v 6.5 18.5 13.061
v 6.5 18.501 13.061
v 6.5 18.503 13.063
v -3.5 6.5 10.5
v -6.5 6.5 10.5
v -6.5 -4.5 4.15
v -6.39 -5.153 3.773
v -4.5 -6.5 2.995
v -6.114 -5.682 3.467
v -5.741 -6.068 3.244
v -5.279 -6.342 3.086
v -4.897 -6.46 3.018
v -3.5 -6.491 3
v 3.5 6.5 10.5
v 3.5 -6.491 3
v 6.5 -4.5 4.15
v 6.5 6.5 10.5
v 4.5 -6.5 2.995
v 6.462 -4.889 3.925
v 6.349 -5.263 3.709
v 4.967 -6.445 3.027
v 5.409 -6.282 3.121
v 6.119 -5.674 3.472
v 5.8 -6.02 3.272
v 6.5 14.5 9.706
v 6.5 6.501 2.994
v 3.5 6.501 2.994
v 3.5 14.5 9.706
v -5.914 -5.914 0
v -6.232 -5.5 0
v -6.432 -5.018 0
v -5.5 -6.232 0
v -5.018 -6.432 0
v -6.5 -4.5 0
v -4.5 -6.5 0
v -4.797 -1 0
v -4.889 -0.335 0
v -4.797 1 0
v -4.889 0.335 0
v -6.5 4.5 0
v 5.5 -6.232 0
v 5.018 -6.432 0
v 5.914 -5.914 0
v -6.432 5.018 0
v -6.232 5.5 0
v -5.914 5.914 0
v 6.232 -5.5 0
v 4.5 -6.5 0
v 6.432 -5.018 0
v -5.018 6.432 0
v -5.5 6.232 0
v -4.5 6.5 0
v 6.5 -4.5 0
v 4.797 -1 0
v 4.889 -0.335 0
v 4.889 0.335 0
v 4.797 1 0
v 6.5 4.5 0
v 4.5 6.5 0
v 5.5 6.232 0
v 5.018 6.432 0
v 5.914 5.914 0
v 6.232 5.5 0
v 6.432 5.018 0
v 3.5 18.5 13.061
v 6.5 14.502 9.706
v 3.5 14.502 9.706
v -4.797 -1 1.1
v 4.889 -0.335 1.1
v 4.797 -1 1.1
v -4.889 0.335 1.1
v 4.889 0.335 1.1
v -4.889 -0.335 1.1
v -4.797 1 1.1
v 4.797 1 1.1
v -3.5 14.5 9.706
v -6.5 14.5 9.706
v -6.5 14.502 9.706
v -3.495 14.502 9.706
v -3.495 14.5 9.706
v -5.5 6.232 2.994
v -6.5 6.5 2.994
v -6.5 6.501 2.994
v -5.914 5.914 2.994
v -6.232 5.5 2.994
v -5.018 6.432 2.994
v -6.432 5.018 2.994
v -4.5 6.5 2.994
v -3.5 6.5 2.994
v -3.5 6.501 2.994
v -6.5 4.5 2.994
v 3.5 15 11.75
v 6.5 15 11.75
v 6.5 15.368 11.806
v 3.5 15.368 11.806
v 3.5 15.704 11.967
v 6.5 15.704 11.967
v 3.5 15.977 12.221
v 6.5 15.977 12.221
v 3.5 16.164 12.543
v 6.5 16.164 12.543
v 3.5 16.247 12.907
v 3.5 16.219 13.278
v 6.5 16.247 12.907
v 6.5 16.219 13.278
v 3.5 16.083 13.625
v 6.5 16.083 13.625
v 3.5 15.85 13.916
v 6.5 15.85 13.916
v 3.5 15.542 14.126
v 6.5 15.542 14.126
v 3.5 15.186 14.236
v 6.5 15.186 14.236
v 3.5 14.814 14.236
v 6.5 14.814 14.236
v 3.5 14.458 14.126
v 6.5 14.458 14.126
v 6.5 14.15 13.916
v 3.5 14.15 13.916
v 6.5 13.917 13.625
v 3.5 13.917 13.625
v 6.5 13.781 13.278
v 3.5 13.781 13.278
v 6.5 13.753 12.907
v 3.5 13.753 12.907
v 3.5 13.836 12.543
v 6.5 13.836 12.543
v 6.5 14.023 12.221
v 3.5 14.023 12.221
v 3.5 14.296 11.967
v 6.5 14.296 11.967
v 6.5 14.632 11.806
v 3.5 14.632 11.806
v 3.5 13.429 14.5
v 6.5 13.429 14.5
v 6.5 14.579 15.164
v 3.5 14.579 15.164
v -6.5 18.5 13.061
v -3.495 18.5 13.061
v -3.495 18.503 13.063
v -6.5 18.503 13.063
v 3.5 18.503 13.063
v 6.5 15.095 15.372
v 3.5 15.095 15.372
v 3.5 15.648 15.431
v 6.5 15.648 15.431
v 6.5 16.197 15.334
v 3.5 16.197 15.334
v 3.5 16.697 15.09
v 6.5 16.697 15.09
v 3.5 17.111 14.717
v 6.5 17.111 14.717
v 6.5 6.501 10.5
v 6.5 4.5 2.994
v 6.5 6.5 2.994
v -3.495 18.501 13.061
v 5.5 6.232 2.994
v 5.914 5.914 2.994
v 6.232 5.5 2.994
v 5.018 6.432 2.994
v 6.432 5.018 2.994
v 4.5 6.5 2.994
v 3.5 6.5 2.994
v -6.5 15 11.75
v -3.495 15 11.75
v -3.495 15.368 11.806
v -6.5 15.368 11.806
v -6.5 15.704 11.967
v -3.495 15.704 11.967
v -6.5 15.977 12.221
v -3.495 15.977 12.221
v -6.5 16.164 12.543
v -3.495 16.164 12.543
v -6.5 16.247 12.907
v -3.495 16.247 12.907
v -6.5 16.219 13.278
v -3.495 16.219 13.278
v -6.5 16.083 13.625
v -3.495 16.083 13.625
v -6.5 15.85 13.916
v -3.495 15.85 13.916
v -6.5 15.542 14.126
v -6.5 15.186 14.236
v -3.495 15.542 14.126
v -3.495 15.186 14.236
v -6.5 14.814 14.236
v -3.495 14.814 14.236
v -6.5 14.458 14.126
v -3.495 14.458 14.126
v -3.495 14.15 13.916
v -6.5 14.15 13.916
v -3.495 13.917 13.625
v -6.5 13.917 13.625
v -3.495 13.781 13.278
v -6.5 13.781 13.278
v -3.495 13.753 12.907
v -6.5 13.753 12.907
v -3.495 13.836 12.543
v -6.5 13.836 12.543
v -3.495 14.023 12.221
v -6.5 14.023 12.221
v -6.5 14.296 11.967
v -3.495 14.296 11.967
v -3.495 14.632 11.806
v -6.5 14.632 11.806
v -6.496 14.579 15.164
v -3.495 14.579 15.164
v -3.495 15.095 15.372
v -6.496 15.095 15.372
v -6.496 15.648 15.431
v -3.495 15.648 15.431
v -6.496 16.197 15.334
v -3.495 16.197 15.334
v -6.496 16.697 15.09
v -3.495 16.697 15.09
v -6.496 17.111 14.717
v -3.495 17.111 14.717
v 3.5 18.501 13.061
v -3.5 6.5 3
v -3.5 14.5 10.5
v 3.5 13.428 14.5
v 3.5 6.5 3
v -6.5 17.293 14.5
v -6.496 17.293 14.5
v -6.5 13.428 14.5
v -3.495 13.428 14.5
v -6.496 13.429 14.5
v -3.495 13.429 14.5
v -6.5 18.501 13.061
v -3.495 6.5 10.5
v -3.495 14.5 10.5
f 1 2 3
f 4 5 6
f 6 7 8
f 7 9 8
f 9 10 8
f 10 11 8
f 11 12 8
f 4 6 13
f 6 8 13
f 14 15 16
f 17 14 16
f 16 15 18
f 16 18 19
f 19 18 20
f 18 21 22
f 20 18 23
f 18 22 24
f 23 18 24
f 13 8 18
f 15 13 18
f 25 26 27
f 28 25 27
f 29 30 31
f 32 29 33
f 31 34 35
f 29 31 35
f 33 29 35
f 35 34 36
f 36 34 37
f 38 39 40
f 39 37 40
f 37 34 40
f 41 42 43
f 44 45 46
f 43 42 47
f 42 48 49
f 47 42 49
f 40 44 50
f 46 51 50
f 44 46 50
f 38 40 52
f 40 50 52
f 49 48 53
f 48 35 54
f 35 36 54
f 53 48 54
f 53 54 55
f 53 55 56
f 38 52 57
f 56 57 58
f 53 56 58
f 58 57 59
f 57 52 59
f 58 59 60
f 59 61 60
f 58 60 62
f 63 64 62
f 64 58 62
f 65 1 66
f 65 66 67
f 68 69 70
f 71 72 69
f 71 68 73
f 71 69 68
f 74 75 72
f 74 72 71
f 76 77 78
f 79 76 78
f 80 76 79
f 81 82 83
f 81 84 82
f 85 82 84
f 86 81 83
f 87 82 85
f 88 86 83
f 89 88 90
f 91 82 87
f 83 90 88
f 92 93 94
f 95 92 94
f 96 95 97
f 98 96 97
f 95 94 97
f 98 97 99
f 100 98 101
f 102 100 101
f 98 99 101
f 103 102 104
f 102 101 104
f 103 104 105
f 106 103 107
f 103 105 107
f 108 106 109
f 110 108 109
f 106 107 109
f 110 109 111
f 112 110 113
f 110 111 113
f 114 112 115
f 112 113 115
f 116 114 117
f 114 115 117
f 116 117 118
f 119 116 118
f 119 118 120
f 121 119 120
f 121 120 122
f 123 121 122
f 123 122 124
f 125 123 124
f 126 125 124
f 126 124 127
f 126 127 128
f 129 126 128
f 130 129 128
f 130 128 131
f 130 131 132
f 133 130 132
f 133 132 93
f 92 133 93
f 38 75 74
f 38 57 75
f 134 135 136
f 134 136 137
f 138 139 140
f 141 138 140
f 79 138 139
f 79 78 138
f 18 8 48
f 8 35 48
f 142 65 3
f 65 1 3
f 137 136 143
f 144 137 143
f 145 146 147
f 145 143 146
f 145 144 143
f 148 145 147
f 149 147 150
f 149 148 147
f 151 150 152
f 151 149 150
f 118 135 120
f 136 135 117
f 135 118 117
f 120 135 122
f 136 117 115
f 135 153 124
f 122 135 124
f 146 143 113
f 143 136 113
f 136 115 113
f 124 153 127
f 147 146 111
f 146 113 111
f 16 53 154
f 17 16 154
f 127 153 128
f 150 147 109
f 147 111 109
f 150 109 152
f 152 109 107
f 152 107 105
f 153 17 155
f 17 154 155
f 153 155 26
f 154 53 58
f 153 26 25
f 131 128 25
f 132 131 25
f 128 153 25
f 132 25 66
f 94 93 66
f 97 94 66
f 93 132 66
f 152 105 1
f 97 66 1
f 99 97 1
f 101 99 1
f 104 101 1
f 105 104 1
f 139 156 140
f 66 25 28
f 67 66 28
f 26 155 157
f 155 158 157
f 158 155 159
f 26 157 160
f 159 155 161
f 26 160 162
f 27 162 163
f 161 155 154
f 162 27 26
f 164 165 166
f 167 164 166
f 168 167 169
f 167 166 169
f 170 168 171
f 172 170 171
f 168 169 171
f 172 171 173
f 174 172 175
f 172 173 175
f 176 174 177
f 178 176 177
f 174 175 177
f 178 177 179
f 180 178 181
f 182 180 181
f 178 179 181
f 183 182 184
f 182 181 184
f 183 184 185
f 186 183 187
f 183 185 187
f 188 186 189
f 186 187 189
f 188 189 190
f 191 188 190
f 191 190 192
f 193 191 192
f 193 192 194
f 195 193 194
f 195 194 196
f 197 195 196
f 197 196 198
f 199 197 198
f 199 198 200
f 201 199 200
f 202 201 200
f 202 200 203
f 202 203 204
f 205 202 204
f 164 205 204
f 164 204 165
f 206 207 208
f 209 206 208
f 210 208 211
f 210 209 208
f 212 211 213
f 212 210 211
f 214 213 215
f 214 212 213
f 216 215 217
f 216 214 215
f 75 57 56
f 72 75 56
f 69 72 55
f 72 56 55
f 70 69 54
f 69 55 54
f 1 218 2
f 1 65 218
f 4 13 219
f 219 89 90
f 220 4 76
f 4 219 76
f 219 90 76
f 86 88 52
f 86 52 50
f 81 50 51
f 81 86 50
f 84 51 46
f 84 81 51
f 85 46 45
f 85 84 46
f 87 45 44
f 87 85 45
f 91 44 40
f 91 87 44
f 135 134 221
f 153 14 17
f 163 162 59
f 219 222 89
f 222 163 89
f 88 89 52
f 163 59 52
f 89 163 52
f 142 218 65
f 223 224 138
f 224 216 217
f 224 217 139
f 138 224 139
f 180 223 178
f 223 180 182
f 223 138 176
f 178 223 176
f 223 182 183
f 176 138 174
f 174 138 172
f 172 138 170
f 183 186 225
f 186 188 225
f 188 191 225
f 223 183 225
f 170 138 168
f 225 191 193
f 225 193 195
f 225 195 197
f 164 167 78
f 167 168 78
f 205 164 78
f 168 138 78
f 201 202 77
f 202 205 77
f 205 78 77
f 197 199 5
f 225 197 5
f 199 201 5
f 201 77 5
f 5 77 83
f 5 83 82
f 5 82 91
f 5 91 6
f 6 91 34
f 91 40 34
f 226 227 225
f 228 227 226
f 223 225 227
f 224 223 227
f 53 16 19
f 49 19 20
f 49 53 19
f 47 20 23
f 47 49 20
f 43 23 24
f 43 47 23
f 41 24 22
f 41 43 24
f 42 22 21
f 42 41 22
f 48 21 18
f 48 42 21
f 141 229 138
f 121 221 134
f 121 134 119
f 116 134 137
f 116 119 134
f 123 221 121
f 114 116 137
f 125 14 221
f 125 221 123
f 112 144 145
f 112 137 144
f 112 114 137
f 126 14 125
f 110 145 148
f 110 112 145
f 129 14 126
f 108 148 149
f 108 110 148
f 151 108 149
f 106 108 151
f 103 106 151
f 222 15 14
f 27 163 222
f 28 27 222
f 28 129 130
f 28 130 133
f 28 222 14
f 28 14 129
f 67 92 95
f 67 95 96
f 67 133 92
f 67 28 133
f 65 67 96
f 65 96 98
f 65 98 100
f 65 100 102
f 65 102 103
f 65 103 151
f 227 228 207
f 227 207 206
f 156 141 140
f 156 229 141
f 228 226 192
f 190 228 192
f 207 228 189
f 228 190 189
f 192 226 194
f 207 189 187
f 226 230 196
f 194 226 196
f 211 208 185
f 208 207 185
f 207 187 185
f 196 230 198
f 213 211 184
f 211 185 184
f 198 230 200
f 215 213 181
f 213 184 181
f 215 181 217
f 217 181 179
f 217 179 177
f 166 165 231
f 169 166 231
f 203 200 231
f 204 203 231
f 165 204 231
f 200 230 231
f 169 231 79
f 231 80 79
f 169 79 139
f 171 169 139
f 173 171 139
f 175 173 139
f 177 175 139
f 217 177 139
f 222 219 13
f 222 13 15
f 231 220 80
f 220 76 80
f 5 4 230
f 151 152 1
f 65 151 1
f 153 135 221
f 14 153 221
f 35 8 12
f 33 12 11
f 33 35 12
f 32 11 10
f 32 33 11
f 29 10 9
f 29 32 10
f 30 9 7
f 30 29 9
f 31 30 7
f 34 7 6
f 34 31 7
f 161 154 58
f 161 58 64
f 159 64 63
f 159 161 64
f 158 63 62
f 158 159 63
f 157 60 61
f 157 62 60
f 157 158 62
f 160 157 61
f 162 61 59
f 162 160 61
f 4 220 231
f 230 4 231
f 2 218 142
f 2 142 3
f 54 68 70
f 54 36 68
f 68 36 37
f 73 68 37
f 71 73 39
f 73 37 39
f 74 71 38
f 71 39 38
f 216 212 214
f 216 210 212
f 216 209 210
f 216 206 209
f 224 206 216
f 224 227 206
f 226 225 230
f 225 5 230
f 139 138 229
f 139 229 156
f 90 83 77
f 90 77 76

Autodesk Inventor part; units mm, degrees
ref_plane "YZ Plane" through (0, 0, 0) normal (1, 0, 0) x (0, 1, 0)
ref_plane "XZ Plane" through (0, 0, 0) normal (0, 1, 0) x (-1, 0, 0)
ref_plane "XY Plane" through (0, 0, 0) normal (0, 0, 1) x (1, 0, 0)
sketch "Sketch1" plane through (0, 0, 0) normal (0, 0, 1) x (1, 0, 0)
  line L0 (6.5, 6.5) -> (-6.5, 6.5)
  line L1 (-6.5, 6.5) -> (-6.5, -6.5)
  line L2 (-6.5, -6.5) -> (6.5, -6.5)
  line L3 (6.5, -6.5) -> (6.5, 6.5)
  line L4 (6.5, 6.5) -> (-6.5, -6.5) construction
  line L5 (-6.5, 6.5) -> (6.5, -6.5) construction
  point P0 (0, 0)
  point P1 (0, 0)
  dimension "d35" = 13
  dimension "d36" = 13
extrude "Extrusion1" add sketch "Sketch1" along normal blind 3
sketch "Sketch2" plane through (0, 0, 0) normal (0, 0, -1) x (-1, 0, 0)
  line L0 (-6.5, 1) -> (6.5, 1)
  line L1 (6.5, 1) -> (6.5, -1)
  line L2 (6.5, -1) -> (-6.5, -1)
  line L3 (-6.5, -1) -> (-6.5, 1)
  line L4 (-6.5, 1) -> (6.5, -1) construction
  line L5 (6.5, 1) -> (-6.5, -1) construction
  circle A0 centre (0, 0) radius 4.9
  point P0 (4.7969, 1)
  point P1 (-4.7969, 1)
  point P2 (-4.7969, -1)
  point P3 (4.7969, -1)
  dimension "d3" = 2
  dimension "d4" = 13
  dimension "d57" = 9.8
extrude "Extrusion2" cut sketch "Sketch2" against normal blind 1.1 contours L0 A0 L2
sketch "Sketch6" plane through (0, 0, 3) normal (0, 0, 1) x (1, 0, 0)
  line L0 (3.5, 6.5) -> (6.5, 6.5)
  line L1 (6.5, 6.5) -> (6.5, -6.5)
  line L2 (6.5, -6.5) -> (3.5, -6.5)
  line L3 (3.5, -6.5) -> (3.5, 6.5)
  line L4 (3.5, 6.5) -> (6.5, -6.5) construction
  line L5 (6.5, 6.5) -> (3.5, -6.5) construction
  line L6 (-3.5, 6.5) -> (-6.5, 6.5)
  line L7 (-6.5, 6.5) -> (-6.5, -6.5)
  line L8 (-6.5, -6.5) -> (-3.5, -6.5)
  line L9 (-3.5, -6.5) -> (-3.5, 6.5)
  line L10 (-3.5, 6.5) -> (-6.5, -6.5) construction
  line L11 (-6.5, 6.5) -> (-3.5, -6.5) construction
  line L12 (10.9648, 0) -> (-10.9648, 0) construction
  point P0 (0, 0)
  point P1 (5, 0)
  point P2 (-5, 0)
  point P3 (0, 0)
  dimension "d29" = 5
  dimension "d30" = 5
  dimension "d31" = 3
  dimension "d32" = 3
  dimension "d33" = 13
  dimension "d34" = 13
extrude "Extrusion6" add sketch "Sketch6" along normal blind 7.5
chamfer "Chamfer5" distance 13 angle 30 1 edges at (-5, -6.5, 10.5) measured on face at (-4.5, -2.1667, 10.5)
sketch "Sketch10" plane through (-6.5, 6.5, 0) normal (0, 1, 0) x (1, 0, 0)
  line L0 (3, -10.5) -> (0, -10.5) projected
  line L1 (0, -10.5) -> (0, -2.9944) projected
  line L2 (3, -10.5) -> (0, -10.5)
  line L3 (0, -10.5) -> (0, -2.9944)
  line L4 (0, -2.9944) -> (3, -2.9944)
  line L5 (3, -2.9944) -> (3, -10.5)
  line L6 (10, -10.5) -> (10, -3) projected
  line L7 (13, 0) -> (13, -2.9944) projected
  line L8 (10, -10.5) -> (13, -10.5)
  line L9 (13, -10.5) -> (13, -2.9944)
  line L10 (13, -2.9944) -> (10, -2.9944)
  line L11 (10, -2.9944) -> (10, -10.5)
  point P0 (6.5, 0)
extrude "Extrusion10" add sketch "Sketch10" along normal blind 8
chamfer "Chamfer6" distance 6.712 angle 50 1 edges at (-5, 14.5, 2.9944) measured on face at (-5.5, 14.5, 7.9981)
chamfer "Chamfer7" distance 6.712 angle 50 1 edges at (5, 14.5, 2.9944) measured on face at (5.5, 14.5, 5.4981)
sketch "Sketch16" plane through (3.5, 6.5, 10.5) normal (0, 0, 1) x (1, 0, 0)
  line L0 (3, 8) -> (3, 0.0009) projected
  line L1 (0, 0) -> (0, 8) projected
  line L2 (3, 0.0009) -> (0, 0.0009)
  line L3 (0, 0.0009) -> (0, 8)
  line L4 (0, 8) -> (3, 8)
  line L5 (3, 8) -> (3, 0.0009)
  line L6 (-10, 0) -> (-10, -13) projected
  line L7 (-6.9951, 8) -> (-10, 8)
  line L8 (-10, 8) -> (-10, 0)
  line L9 (-10, 0) -> (-6.9951, 0)
  line L10 (-6.9951, 0) -> (-6.9951, 8)
  point P0 (-3.5, -6.5)
  point P1 (0, 0.0009)
extrude "Extrusion14" add sketch "Sketch16" along normal blind 4
chamfer "Chamfer11" distance 6.928 angle 30 1 edges at (5, 6.5009, 14.5) measured on face at (4.5, 11.8336, 14.5)
chamfer "Chamfer12" distance 6.928 angle 30 1 edges at (-4.9975, 6.5, 14.5) measured on face at (-4.4967, 9.1667, 14.5)
sketch "Sketch17" plane through (-6.5, 14.5, 0) normal (0, 1, 0) x (1, 0, 0)
  line L0 (0, -9.7064) -> (3, -9.7064) projected
  line L1 (3.0049, -14.5) -> (0, -14.5) projected
  line L2 (0, -9.7064) -> (3.0049, -9.7064)
  line L3 (3.0049, -9.7064) -> (3.0049, -14.5)
  line L4 (3.0049, -14.5) -> (0, -14.5)
  line L5 (0, -14.5) -> (0, -9.7064)
  line L6 (10, -14.5) -> (10, -10.5001) projected
  line L7 (13, -9.7064) -> (13, -2.9944) projected
  line L8 (10, -14.5) -> (13, -14.5)
  line L9 (13, -14.5) -> (13, -9.7064)
  line L10 (13, -9.7064) -> (10, -9.7064)
  line L11 (10, -9.7064) -> (10, -14.5)
  point P0 (6.5, 0)
extrude "Extrusion15" add sketch "Sketch17" along normal blind 4
chamfer "Chamfer13" distance 3.355 angle 50 1 edges at (5, 18.5, 9.7064) measured on face at (4.5, 18.5, 11.3043)
chamfer "Chamfer14" distance 3.355 angle 50 1 edges at (-4.9975, 18.5, 9.7064) measured on face at (-5.4984, 18.5, 11.3043)
sketch "Sketch18" plane through (-6.5, 18.5, 0) normal (0, 1, 0) x (1, 0, 0)
  line L0 (0, -14.5) -> (0, -10.5001) projected
  line L1 (0, -13.0614) -> (3.0049, -13.0614) projected
  line L2 (0, -14.5) -> (3.0049, -14.5)
  line L3 (3.0049, -14.5) -> (3.0049, -13.0614)
  line L4 (3.0049, -13.0614) -> (0, -13.0614)
  line L5 (0, -13.0614) -> (0, -14.5)
  line L6 (13, -10.5001) -> (13, -14.5) projected
  line L7 (10, -14.5) -> (10, -10.5001) projected
  line L8 (13, -14.5) -> (10, -14.5)
  line L9 (10, -14.5) -> (10, -13.0614)
  line L10 (10, -13.0614) -> (13, -13.0614)
  line L11 (13, -13.0614) -> (13, -14.5)
  point P0 (6.5, 0)
extrude "Extrusion16" add sketch "Sketch18" along normal blind 1.5
chamfer "Chamfer15" distance 1.258 angle 50 1 edges at (5, 20, 13.0614) measured on face at (4.5, 20, 14.0205)
chamfer "Chamfer16" distance 1.258 angle 50 1 edges at (-4.9975, 20, 13.0614) measured on face at (-5.4984, 20, 13.541)
sketch "Sketch19" plane through (6.5, -6.5, 0) normal (1, 0, 0) x (0, 0, -1)
  circle A0 centre (-13, 21.5) radius 1.25
  line L0 (0, 0) -> (0, 13) projected
  point P0 (0, 6.5)
  point P1 (0, 6.5)
  point P2 (0, 6.5)
  dimension "d114" = 2.5
  dimension "d115" = 15
  dimension "d116" = 13
extrude "Extrusion17" cut sketch "Sketch19" against normal blind 13
sketch "Sketch20" plane through (3.5, 6.5, 14.5) normal (0, 0, 1) x (1, 0, 0)
  line L0 (3, 0.0009) -> (3, 6.9289) projected
  line L1 (3, 6.9289) -> (0, 6.9289)
  line L2 (0, 6.9289) -> (0, 13.5)
  line L3 (0, 13.5) -> (3, 13.5)
  line L4 (3, 13.5) -> (3, 6.9289)
  line L5 (-6.9951, 0) -> (-6.9951, 8) projected
  line L6 (-6.9951, 6.9289) -> (-9.9959, 6.9289)
  line L7 (-9.9959, 6.9289) -> (-9.9959, 13.5)
  line L8 (-9.9959, 13.5) -> (-6.9951, 13.5)
  line L9 (-6.9951, 13.5) -> (-6.9951, 6.9289)
  point P0 (-3.5, -6.5)
extrude "Extrusion18" add sketch "Sketch20" along normal blind 2
chamfer "Chamfer17" distance 3.464 angle 30 1 edges at (5, 13.4289, 16.5) measured on face at (4.5, 17.8096, 16.5)
chamfer "Chamfer18" distance 3.464 angle 30 1 edges at (-4.9955, 13.4289, 16.5) measured on face at (-5.4956, 17.8096, 16.5)
sketch "Sketch21" plane through (6.5, -6.5, 0) normal (1, 0, 0) x (0, 0, -1)
  line L0 (-14.5001, 19.9289) -> (-16.5, 23.3929) projected
  line L1 (-13.0614, 25) -> (-9.7064, 21.0017) projected
  line L2 (-16.0029, 22.5319) -> (-13.0614, 25)
  line L3 (-13.0614, 25) -> (-15.218, 28.5486)
  line L4 (-15.218, 28.5486) -> (-18.5529, 25)
  line L5 (-18.5529, 25) -> (-17.0876, 20.6155)
  line L6 (-17.0876, 20.6155) -> (-16.0029, 22.5319)
  point P0 (0, 6.5)
extrude "Extrusion19" cut sketch "Sketch21" against normal blind 13
fillet "Fillet4" radius 2 2 edges at (5, 16.0319, 16.0029) (-4.9955, 16.0319, 16.0029)
fillet "Fillet5" radius 2 4 edges at (-6.5, -6.5, 1.4975) (-6.5, 6.5, 1.4972) (6.5, 6.5, 1.4972) (6.5, -6.5, 1.4975)
properties part number "PodstawkaKola Próba 1"
